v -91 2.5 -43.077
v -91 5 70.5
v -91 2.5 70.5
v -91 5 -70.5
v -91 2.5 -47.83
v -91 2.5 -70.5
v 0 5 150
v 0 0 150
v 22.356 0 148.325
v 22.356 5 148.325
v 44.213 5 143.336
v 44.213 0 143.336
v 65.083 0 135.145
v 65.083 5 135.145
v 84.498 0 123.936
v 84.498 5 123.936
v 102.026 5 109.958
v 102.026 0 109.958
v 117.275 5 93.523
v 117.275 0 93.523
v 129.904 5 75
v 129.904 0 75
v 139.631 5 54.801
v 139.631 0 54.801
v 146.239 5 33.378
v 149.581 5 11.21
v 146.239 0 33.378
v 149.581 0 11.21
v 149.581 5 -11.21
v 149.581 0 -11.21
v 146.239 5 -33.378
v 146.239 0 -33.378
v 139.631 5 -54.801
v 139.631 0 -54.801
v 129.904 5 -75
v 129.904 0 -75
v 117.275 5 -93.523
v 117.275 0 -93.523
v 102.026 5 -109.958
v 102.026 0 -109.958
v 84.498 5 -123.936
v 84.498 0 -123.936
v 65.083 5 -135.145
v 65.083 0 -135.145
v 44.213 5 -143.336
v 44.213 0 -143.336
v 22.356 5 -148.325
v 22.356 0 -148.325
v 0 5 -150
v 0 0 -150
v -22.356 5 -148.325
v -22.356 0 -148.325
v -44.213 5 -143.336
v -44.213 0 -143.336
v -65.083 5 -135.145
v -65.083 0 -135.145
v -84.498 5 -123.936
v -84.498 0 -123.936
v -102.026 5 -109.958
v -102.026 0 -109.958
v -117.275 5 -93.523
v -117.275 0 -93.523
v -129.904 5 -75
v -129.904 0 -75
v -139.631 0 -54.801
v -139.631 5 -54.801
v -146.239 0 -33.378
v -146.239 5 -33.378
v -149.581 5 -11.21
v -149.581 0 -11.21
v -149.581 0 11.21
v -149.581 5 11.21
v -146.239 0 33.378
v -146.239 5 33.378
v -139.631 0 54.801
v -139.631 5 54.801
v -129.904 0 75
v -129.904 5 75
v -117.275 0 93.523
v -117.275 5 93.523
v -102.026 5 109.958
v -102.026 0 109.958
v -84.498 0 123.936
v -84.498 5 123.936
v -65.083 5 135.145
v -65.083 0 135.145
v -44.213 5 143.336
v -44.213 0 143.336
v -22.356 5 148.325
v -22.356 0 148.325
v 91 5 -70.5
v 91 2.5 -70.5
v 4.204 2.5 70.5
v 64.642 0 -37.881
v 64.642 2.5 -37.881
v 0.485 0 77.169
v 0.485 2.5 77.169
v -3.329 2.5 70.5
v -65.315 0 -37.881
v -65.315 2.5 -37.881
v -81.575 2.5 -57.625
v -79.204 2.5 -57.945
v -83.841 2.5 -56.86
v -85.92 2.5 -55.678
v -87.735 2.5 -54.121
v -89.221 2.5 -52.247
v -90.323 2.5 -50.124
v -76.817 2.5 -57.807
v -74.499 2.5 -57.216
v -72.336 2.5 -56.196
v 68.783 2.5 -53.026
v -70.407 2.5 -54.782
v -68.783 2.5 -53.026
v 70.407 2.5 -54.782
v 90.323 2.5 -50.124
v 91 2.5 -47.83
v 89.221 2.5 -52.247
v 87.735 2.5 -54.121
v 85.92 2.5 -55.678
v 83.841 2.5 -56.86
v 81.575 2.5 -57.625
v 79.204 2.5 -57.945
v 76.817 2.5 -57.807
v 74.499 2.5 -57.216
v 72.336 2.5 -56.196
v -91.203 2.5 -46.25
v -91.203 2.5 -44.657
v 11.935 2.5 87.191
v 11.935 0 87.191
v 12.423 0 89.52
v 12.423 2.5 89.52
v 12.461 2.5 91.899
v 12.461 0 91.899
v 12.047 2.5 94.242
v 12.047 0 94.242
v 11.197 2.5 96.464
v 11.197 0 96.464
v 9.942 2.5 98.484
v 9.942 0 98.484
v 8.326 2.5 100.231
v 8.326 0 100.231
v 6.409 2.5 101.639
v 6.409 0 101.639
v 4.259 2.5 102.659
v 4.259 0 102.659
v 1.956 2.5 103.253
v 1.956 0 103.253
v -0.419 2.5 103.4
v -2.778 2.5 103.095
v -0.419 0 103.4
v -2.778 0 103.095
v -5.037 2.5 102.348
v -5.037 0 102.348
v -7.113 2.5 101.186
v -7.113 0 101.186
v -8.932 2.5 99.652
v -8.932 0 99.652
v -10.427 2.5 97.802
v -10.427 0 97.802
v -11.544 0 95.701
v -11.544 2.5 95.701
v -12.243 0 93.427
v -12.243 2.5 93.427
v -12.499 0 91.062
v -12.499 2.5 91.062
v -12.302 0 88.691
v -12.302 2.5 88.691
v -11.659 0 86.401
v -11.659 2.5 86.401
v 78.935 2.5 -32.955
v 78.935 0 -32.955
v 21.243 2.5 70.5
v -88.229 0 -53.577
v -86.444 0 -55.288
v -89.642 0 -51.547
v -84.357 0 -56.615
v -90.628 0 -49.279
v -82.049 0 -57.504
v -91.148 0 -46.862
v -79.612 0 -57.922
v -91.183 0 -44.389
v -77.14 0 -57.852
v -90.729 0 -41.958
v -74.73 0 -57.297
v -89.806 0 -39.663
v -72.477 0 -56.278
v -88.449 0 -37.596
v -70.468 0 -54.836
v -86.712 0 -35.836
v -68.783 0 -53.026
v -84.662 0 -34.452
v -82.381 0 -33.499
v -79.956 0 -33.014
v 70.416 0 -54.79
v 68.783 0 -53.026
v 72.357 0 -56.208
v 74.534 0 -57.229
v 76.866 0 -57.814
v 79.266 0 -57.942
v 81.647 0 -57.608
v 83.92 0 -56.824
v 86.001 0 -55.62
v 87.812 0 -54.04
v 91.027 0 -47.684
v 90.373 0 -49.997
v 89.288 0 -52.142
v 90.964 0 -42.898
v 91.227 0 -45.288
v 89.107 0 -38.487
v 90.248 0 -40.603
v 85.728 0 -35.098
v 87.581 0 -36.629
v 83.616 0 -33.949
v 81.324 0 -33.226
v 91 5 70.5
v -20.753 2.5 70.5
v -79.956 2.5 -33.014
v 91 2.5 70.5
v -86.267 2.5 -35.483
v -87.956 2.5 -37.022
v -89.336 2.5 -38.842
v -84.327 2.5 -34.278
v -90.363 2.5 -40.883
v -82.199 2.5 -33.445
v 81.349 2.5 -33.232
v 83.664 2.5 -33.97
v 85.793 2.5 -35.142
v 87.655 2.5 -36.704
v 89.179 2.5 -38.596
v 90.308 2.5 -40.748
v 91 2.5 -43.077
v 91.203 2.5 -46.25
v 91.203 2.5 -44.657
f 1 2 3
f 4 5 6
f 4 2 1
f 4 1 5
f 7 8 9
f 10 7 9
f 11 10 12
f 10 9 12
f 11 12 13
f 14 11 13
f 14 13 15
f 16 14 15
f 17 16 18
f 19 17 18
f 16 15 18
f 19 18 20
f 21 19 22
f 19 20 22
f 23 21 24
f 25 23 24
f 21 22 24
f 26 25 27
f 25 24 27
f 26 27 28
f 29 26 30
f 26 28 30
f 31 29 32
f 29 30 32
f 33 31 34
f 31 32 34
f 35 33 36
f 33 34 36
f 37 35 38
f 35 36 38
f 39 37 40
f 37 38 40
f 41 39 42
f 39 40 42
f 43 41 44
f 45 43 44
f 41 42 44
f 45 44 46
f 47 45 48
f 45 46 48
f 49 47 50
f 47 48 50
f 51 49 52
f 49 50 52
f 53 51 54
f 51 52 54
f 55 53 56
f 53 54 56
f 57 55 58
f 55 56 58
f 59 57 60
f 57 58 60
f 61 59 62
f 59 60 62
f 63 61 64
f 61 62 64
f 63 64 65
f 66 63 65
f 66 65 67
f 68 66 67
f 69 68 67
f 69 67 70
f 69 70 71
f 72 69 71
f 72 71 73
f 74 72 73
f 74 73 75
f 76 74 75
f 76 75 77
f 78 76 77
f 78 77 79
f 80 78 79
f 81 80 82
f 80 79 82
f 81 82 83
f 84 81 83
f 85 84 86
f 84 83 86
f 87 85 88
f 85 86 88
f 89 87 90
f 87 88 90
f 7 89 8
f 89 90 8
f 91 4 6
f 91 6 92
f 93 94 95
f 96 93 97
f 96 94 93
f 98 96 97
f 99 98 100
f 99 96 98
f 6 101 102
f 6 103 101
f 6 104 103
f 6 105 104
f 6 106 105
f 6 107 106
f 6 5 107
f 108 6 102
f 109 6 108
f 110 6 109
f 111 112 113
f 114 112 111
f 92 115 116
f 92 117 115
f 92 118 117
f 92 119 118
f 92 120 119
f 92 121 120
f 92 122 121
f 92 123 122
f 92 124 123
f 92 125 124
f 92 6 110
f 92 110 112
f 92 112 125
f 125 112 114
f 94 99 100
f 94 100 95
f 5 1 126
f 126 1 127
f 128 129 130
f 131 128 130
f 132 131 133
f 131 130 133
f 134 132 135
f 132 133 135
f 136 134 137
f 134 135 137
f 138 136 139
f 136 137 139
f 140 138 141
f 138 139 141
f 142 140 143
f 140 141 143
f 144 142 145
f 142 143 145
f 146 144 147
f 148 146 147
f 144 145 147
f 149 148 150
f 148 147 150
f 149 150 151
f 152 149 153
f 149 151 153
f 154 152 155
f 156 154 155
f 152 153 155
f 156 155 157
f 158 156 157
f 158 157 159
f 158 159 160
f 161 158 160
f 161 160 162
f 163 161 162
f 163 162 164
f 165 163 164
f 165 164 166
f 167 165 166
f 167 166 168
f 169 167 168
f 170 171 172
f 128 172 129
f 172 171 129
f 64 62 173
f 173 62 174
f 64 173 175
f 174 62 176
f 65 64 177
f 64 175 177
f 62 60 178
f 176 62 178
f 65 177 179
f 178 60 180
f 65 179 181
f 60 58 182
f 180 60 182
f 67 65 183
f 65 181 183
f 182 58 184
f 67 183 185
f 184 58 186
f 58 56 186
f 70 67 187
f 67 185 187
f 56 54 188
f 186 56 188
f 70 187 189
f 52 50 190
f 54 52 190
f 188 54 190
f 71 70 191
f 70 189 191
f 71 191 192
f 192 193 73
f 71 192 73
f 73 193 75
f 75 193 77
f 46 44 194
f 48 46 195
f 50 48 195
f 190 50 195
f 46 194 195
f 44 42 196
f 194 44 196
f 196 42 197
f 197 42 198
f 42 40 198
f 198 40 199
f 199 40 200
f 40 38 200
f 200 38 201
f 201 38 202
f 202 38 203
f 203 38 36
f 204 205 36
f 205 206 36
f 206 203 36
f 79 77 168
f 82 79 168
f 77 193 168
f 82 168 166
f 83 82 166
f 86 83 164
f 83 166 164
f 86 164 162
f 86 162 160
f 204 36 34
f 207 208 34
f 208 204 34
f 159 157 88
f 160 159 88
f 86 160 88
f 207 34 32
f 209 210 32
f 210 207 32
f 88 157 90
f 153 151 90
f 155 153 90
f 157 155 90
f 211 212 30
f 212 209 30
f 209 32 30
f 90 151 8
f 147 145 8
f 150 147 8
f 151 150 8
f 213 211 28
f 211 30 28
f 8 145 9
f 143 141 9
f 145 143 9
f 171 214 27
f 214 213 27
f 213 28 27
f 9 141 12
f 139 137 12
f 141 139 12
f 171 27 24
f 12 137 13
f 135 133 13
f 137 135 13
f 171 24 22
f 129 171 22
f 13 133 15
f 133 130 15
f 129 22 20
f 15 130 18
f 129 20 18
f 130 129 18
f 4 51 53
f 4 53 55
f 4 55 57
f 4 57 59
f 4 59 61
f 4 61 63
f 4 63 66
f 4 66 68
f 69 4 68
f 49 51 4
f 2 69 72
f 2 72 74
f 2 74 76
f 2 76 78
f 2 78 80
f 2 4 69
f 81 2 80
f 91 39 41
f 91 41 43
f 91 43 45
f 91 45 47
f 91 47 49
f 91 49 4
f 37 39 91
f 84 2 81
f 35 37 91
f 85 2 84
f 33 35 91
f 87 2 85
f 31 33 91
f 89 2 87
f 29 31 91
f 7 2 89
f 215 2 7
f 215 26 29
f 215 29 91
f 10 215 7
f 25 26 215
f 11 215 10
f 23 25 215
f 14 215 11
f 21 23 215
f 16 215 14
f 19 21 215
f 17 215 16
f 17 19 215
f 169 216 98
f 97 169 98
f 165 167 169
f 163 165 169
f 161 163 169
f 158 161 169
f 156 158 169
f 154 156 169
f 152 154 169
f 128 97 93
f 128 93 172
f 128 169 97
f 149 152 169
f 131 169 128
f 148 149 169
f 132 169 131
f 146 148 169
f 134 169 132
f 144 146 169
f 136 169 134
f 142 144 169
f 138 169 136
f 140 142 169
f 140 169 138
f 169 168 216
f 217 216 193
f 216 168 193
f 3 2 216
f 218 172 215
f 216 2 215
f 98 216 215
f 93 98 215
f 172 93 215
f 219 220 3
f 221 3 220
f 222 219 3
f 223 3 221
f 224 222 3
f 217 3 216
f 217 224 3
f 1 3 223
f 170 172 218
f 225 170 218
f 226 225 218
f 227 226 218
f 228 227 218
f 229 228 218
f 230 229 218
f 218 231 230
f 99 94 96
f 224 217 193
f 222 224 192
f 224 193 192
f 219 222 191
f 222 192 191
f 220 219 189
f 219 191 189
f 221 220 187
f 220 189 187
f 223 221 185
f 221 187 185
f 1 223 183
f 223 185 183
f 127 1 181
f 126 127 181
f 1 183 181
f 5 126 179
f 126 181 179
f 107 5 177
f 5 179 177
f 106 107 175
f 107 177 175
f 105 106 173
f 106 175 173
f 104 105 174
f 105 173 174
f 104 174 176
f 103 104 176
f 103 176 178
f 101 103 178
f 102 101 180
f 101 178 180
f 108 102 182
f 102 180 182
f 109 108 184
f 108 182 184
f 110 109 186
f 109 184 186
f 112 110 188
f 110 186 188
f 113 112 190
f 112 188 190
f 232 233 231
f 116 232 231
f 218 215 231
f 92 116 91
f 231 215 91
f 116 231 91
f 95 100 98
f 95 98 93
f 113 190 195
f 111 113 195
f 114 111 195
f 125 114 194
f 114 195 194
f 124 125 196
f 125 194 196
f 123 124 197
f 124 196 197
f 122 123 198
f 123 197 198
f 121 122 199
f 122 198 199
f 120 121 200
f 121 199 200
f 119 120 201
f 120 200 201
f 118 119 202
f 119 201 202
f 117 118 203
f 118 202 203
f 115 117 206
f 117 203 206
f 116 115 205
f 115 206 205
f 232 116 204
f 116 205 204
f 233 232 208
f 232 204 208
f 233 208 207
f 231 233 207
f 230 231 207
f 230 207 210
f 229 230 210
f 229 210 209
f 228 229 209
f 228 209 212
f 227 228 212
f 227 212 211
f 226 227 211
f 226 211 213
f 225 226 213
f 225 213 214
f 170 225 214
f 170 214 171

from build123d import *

# Parameters (mm, degrees)
SKETCH1_R           = 150
BOSS_EXTRUDE1_DEPTH = 5
SKETCH2_R           = 12.5
CUT_EXTRUDE1_DEPTH  = 2.5
SKETCH4_W           = 182
SKETCH4_H           = 141
CUT_EXTRUDE2_DEPTH  = 2.5
CUT_EXTRUDE3_DEPTH  = 2.5


with BuildPart() as part:
    # Sketch1 → Boss-Extrude1 (new body)
    with BuildSketch(Plane(origin=(0, 0, 0), x_dir=(1, 0, 0), z_dir=(0, 1, 0))):
        with Locations(Location((0, 0, 0), (0, 0, 270))):
            Circle(SKETCH1_R)
    extrude(amount=BOSS_EXTRUDE1_DEPTH)

    # Sketch2 → Cut-Extrude1 (cut)
    with BuildSketch(Plane.XZ):
        with Locations(Location((0, 90.907224223, 0), (0, 0, 270))):
            Circle(SKETCH2_R)
        with Locations(Location((78.727965565, -45.453612112, 0), (0, 0, 270))):
            Circle(SKETCH2_R)
        with Locations(Location((-78.727965565, -45.453612112, 0), (0, 0, 270))):
            Circle(SKETCH2_R)
    extrude(amount=-CUT_EXTRUDE1_DEPTH, mode=Mode.SUBTRACT)

    # Sketch4 → Cut-Extrude2 (cut)
    with BuildSketch(Plane(origin=(0, 5, 0), x_dir=(1, 0, 0), z_dir=(0, 1, 0))):
        Rectangle(SKETCH4_W, SKETCH4_H)
    extrude(amount=-CUT_EXTRUDE2_DEPTH, mode=Mode.SUBTRACT)

    # Sketch5 → Cut-Extrude3 (cut)
    with BuildSketch(Plane.XZ):
        with BuildLine():
            Line((-11.659324393, 86.400545325), (-79.955582896, -33.014039945))
            ThreePointArc((-79.955582896, -33.014039945), (-67.813794545, -39.360101552), (-68.782668785, -53.0260009))
            Line((-68.782668785, -53.0260009), (68.782668785, -53.0260009))
            ThreePointArc((68.782668785, -53.0260009), (67.573694856, -39.811604938), (78.934736548, -32.955322398))
            Line((78.934736548, -32.955322398), (11.934955449, 87.191468792))
            ThreePointArc((11.934955449, 87.191468792), (0.418787658, 78.414241517), (-11.659324393, 86.400545325))
        make_face()
        Polygon((0.484780027, 77.168816505), (-65.315283199, -37.881223324), (64.642360996, -37.881223324), align=None, mode=Mode.SUBTRACT)
    extrude(amount=-CUT_EXTRUDE3_DEPTH, mode=Mode.SUBTRACT)


solid = part.part
